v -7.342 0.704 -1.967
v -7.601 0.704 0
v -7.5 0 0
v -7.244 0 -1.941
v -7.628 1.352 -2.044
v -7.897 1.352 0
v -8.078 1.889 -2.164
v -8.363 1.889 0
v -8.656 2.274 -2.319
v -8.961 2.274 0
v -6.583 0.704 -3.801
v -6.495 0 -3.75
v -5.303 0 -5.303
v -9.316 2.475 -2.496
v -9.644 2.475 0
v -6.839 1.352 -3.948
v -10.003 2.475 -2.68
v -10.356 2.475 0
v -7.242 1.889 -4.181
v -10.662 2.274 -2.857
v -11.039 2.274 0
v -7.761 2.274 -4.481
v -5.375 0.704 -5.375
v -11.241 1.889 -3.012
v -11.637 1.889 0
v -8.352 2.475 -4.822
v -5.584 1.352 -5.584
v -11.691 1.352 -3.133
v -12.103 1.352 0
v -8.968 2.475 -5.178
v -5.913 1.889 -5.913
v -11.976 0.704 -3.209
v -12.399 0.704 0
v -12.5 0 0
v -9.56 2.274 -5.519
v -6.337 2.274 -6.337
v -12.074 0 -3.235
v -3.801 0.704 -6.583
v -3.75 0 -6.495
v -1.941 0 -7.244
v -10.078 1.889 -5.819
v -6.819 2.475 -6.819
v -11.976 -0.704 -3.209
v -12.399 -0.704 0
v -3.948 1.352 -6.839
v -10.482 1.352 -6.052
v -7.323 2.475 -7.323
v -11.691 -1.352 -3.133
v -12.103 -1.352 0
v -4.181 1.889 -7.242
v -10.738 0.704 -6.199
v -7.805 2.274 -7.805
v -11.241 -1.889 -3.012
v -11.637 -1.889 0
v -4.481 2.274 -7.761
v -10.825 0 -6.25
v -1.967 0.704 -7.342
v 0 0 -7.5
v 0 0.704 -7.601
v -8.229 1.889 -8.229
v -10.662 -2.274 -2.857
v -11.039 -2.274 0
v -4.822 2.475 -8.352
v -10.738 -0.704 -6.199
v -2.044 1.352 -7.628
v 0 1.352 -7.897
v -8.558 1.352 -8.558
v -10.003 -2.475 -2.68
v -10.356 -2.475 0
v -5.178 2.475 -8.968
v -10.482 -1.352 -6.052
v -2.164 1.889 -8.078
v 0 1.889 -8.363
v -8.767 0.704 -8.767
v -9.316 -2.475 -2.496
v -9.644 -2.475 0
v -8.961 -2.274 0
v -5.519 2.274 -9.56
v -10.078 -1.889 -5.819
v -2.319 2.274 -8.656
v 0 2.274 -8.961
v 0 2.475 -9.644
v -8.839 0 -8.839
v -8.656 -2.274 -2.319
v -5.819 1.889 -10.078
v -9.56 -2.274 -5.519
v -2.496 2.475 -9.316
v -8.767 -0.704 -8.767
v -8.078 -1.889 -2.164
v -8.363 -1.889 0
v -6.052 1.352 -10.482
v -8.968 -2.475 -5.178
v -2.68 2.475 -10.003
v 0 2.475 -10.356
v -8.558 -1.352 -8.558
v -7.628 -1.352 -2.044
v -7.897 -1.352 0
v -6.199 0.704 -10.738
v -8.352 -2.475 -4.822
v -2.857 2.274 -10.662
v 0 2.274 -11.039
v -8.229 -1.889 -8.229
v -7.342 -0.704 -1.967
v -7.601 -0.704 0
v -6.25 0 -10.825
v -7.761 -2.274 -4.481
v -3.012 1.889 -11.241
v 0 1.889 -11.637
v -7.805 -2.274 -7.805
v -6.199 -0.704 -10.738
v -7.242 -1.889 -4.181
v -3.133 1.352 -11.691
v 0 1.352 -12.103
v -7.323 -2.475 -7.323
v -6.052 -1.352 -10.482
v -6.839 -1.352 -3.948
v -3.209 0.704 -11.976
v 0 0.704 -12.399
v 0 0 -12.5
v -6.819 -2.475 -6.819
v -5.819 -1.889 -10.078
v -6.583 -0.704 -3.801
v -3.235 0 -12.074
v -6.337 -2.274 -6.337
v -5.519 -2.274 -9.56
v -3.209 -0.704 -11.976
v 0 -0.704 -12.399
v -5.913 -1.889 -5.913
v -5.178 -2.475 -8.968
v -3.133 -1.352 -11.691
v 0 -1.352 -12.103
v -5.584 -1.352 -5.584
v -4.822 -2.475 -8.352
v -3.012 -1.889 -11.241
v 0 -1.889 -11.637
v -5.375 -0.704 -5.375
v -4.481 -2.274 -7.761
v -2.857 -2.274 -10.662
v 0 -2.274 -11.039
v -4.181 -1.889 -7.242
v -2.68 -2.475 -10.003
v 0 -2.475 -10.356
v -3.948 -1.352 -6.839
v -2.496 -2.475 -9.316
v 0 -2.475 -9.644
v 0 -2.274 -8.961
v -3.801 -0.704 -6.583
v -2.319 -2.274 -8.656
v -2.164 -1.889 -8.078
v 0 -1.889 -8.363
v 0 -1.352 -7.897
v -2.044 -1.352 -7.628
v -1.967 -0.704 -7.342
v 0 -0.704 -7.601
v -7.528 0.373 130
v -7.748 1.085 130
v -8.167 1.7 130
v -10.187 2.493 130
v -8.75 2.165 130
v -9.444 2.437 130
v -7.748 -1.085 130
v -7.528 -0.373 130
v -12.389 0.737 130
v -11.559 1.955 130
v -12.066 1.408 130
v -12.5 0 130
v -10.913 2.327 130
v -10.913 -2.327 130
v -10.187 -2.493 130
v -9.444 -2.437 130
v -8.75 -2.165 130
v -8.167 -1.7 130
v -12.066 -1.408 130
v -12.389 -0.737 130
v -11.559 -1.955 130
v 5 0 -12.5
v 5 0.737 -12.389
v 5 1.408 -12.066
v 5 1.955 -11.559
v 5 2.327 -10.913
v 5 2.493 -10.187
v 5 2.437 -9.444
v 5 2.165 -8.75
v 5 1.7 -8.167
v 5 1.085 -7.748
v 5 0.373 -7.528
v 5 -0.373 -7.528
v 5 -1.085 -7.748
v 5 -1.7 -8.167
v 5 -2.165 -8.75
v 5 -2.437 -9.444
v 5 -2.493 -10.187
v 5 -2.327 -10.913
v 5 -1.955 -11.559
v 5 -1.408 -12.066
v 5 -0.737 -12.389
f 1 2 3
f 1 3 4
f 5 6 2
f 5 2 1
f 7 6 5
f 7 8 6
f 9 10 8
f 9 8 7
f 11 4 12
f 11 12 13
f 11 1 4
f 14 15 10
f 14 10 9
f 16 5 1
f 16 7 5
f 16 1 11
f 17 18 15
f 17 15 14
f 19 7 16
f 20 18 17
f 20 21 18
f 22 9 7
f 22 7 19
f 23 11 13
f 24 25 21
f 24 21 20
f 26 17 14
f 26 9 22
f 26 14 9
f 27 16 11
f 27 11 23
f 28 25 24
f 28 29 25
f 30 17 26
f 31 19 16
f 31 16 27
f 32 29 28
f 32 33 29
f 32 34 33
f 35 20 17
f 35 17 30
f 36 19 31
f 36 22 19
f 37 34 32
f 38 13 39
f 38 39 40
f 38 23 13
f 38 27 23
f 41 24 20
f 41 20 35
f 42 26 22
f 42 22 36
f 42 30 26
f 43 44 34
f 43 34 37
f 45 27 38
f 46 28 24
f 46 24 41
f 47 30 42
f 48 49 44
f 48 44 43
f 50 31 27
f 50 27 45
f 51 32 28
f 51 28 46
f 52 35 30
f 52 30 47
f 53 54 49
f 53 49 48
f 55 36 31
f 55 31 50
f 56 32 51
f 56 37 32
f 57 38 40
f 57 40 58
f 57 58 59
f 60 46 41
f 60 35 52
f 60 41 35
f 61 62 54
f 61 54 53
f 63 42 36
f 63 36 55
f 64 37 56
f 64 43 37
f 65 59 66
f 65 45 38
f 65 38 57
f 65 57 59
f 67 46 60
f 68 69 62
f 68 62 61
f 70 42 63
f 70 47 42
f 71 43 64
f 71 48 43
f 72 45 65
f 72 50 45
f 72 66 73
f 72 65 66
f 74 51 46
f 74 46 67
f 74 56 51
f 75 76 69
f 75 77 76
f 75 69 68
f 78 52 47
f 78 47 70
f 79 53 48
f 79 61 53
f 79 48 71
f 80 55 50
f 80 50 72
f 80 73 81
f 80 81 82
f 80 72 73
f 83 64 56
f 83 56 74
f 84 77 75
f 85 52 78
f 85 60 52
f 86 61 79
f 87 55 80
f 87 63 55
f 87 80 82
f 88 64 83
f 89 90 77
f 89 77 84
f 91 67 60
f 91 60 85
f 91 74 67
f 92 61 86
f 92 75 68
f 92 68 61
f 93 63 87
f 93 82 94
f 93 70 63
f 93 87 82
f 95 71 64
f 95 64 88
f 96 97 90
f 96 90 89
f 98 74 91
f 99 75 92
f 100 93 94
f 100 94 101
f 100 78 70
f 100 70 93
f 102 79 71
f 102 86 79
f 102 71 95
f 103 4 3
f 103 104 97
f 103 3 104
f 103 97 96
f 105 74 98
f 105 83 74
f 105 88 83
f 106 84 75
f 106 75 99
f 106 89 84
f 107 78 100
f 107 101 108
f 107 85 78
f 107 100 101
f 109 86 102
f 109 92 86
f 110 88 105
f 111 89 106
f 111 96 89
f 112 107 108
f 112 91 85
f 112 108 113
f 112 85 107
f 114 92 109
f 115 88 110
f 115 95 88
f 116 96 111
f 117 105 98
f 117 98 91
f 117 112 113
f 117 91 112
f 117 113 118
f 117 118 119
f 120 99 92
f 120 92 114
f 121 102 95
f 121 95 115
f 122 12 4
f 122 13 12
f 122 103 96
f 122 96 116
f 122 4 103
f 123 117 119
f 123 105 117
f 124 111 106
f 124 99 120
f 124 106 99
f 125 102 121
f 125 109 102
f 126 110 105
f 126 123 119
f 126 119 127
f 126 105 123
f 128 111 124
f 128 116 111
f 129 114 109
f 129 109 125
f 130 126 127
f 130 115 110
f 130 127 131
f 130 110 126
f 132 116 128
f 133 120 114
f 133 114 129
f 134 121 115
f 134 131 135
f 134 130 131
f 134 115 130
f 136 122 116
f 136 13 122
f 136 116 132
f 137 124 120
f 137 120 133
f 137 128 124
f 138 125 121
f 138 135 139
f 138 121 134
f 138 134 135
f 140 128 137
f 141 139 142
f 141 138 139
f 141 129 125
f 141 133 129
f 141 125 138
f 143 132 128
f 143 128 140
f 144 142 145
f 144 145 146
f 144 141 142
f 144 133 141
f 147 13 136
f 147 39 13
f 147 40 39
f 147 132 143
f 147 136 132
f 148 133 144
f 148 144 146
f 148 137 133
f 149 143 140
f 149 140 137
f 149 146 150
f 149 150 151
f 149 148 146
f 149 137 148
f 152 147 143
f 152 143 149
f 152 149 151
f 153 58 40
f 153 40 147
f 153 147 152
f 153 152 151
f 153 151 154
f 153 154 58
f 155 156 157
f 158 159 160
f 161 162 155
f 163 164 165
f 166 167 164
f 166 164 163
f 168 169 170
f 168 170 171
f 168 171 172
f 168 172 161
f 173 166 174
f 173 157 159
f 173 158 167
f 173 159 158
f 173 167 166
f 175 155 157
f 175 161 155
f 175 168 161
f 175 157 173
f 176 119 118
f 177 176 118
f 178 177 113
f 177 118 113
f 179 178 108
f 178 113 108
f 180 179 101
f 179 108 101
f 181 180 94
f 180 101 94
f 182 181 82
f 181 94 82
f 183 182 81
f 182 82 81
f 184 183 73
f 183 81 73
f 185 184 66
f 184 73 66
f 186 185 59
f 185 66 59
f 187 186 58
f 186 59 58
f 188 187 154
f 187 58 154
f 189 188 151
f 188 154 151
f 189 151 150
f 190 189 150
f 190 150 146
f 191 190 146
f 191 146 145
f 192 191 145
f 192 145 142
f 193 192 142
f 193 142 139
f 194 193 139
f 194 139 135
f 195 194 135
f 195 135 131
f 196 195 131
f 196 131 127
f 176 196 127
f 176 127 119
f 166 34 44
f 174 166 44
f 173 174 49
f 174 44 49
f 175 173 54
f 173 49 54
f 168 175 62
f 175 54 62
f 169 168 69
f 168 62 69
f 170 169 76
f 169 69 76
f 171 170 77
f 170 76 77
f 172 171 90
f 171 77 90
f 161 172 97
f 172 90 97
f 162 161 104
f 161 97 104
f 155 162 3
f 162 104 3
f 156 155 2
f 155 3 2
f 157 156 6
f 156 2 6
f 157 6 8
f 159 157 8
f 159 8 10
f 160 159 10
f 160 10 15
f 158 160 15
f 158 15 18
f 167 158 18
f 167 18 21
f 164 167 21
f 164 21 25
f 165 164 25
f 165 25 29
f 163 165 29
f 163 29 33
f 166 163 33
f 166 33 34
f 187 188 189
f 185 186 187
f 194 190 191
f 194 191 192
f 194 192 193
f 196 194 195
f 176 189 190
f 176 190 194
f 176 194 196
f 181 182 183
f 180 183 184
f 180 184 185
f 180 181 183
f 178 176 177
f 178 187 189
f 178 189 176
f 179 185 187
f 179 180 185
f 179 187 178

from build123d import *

# Parameters (mm, degrees)
ESQUISSE1_R        = 2.5
R_VOLUTION1_ANGLE  = 90
ESQUISSE2_R        = 2.5
BOSS_EXTRU_1_DEPTH = 130
ESQUISSE3_R        = 2.5
BOSS_EXTRU_2_DEPTH = 5


with BuildPart() as part:
    # Esquisse1 → Révolution1 (revolve)
    with BuildSketch(Plane.XY):
        with Locations((-10, 0)):
            Circle(ESQUISSE1_R)
    revolve(axis=Axis((0, 7.956307344, 0), (0, -1, 0)), revolution_arc=R_VOLUTION1_ANGLE)

    # Esquisse2 → Boss.-Extru.1 (add)
    with BuildSketch(Plane.XY):
        with Locations(Location((-10, 0, 0), (0, 0, 180))):
            Circle(ESQUISSE2_R)
    extrude(amount=BOSS_EXTRU_1_DEPTH)

    # Esquisse3 → Boss.-Extru.2 (add)
    with BuildSketch(Plane(origin=(0, 0, 0), x_dir=(0, 0, -1), z_dir=(1, 0, 0))):
        with Locations((10, 0)):
            Circle(ESQUISSE3_R)
    extrude(amount=BOSS_EXTRU_2_DEPTH)


solid = part.part
